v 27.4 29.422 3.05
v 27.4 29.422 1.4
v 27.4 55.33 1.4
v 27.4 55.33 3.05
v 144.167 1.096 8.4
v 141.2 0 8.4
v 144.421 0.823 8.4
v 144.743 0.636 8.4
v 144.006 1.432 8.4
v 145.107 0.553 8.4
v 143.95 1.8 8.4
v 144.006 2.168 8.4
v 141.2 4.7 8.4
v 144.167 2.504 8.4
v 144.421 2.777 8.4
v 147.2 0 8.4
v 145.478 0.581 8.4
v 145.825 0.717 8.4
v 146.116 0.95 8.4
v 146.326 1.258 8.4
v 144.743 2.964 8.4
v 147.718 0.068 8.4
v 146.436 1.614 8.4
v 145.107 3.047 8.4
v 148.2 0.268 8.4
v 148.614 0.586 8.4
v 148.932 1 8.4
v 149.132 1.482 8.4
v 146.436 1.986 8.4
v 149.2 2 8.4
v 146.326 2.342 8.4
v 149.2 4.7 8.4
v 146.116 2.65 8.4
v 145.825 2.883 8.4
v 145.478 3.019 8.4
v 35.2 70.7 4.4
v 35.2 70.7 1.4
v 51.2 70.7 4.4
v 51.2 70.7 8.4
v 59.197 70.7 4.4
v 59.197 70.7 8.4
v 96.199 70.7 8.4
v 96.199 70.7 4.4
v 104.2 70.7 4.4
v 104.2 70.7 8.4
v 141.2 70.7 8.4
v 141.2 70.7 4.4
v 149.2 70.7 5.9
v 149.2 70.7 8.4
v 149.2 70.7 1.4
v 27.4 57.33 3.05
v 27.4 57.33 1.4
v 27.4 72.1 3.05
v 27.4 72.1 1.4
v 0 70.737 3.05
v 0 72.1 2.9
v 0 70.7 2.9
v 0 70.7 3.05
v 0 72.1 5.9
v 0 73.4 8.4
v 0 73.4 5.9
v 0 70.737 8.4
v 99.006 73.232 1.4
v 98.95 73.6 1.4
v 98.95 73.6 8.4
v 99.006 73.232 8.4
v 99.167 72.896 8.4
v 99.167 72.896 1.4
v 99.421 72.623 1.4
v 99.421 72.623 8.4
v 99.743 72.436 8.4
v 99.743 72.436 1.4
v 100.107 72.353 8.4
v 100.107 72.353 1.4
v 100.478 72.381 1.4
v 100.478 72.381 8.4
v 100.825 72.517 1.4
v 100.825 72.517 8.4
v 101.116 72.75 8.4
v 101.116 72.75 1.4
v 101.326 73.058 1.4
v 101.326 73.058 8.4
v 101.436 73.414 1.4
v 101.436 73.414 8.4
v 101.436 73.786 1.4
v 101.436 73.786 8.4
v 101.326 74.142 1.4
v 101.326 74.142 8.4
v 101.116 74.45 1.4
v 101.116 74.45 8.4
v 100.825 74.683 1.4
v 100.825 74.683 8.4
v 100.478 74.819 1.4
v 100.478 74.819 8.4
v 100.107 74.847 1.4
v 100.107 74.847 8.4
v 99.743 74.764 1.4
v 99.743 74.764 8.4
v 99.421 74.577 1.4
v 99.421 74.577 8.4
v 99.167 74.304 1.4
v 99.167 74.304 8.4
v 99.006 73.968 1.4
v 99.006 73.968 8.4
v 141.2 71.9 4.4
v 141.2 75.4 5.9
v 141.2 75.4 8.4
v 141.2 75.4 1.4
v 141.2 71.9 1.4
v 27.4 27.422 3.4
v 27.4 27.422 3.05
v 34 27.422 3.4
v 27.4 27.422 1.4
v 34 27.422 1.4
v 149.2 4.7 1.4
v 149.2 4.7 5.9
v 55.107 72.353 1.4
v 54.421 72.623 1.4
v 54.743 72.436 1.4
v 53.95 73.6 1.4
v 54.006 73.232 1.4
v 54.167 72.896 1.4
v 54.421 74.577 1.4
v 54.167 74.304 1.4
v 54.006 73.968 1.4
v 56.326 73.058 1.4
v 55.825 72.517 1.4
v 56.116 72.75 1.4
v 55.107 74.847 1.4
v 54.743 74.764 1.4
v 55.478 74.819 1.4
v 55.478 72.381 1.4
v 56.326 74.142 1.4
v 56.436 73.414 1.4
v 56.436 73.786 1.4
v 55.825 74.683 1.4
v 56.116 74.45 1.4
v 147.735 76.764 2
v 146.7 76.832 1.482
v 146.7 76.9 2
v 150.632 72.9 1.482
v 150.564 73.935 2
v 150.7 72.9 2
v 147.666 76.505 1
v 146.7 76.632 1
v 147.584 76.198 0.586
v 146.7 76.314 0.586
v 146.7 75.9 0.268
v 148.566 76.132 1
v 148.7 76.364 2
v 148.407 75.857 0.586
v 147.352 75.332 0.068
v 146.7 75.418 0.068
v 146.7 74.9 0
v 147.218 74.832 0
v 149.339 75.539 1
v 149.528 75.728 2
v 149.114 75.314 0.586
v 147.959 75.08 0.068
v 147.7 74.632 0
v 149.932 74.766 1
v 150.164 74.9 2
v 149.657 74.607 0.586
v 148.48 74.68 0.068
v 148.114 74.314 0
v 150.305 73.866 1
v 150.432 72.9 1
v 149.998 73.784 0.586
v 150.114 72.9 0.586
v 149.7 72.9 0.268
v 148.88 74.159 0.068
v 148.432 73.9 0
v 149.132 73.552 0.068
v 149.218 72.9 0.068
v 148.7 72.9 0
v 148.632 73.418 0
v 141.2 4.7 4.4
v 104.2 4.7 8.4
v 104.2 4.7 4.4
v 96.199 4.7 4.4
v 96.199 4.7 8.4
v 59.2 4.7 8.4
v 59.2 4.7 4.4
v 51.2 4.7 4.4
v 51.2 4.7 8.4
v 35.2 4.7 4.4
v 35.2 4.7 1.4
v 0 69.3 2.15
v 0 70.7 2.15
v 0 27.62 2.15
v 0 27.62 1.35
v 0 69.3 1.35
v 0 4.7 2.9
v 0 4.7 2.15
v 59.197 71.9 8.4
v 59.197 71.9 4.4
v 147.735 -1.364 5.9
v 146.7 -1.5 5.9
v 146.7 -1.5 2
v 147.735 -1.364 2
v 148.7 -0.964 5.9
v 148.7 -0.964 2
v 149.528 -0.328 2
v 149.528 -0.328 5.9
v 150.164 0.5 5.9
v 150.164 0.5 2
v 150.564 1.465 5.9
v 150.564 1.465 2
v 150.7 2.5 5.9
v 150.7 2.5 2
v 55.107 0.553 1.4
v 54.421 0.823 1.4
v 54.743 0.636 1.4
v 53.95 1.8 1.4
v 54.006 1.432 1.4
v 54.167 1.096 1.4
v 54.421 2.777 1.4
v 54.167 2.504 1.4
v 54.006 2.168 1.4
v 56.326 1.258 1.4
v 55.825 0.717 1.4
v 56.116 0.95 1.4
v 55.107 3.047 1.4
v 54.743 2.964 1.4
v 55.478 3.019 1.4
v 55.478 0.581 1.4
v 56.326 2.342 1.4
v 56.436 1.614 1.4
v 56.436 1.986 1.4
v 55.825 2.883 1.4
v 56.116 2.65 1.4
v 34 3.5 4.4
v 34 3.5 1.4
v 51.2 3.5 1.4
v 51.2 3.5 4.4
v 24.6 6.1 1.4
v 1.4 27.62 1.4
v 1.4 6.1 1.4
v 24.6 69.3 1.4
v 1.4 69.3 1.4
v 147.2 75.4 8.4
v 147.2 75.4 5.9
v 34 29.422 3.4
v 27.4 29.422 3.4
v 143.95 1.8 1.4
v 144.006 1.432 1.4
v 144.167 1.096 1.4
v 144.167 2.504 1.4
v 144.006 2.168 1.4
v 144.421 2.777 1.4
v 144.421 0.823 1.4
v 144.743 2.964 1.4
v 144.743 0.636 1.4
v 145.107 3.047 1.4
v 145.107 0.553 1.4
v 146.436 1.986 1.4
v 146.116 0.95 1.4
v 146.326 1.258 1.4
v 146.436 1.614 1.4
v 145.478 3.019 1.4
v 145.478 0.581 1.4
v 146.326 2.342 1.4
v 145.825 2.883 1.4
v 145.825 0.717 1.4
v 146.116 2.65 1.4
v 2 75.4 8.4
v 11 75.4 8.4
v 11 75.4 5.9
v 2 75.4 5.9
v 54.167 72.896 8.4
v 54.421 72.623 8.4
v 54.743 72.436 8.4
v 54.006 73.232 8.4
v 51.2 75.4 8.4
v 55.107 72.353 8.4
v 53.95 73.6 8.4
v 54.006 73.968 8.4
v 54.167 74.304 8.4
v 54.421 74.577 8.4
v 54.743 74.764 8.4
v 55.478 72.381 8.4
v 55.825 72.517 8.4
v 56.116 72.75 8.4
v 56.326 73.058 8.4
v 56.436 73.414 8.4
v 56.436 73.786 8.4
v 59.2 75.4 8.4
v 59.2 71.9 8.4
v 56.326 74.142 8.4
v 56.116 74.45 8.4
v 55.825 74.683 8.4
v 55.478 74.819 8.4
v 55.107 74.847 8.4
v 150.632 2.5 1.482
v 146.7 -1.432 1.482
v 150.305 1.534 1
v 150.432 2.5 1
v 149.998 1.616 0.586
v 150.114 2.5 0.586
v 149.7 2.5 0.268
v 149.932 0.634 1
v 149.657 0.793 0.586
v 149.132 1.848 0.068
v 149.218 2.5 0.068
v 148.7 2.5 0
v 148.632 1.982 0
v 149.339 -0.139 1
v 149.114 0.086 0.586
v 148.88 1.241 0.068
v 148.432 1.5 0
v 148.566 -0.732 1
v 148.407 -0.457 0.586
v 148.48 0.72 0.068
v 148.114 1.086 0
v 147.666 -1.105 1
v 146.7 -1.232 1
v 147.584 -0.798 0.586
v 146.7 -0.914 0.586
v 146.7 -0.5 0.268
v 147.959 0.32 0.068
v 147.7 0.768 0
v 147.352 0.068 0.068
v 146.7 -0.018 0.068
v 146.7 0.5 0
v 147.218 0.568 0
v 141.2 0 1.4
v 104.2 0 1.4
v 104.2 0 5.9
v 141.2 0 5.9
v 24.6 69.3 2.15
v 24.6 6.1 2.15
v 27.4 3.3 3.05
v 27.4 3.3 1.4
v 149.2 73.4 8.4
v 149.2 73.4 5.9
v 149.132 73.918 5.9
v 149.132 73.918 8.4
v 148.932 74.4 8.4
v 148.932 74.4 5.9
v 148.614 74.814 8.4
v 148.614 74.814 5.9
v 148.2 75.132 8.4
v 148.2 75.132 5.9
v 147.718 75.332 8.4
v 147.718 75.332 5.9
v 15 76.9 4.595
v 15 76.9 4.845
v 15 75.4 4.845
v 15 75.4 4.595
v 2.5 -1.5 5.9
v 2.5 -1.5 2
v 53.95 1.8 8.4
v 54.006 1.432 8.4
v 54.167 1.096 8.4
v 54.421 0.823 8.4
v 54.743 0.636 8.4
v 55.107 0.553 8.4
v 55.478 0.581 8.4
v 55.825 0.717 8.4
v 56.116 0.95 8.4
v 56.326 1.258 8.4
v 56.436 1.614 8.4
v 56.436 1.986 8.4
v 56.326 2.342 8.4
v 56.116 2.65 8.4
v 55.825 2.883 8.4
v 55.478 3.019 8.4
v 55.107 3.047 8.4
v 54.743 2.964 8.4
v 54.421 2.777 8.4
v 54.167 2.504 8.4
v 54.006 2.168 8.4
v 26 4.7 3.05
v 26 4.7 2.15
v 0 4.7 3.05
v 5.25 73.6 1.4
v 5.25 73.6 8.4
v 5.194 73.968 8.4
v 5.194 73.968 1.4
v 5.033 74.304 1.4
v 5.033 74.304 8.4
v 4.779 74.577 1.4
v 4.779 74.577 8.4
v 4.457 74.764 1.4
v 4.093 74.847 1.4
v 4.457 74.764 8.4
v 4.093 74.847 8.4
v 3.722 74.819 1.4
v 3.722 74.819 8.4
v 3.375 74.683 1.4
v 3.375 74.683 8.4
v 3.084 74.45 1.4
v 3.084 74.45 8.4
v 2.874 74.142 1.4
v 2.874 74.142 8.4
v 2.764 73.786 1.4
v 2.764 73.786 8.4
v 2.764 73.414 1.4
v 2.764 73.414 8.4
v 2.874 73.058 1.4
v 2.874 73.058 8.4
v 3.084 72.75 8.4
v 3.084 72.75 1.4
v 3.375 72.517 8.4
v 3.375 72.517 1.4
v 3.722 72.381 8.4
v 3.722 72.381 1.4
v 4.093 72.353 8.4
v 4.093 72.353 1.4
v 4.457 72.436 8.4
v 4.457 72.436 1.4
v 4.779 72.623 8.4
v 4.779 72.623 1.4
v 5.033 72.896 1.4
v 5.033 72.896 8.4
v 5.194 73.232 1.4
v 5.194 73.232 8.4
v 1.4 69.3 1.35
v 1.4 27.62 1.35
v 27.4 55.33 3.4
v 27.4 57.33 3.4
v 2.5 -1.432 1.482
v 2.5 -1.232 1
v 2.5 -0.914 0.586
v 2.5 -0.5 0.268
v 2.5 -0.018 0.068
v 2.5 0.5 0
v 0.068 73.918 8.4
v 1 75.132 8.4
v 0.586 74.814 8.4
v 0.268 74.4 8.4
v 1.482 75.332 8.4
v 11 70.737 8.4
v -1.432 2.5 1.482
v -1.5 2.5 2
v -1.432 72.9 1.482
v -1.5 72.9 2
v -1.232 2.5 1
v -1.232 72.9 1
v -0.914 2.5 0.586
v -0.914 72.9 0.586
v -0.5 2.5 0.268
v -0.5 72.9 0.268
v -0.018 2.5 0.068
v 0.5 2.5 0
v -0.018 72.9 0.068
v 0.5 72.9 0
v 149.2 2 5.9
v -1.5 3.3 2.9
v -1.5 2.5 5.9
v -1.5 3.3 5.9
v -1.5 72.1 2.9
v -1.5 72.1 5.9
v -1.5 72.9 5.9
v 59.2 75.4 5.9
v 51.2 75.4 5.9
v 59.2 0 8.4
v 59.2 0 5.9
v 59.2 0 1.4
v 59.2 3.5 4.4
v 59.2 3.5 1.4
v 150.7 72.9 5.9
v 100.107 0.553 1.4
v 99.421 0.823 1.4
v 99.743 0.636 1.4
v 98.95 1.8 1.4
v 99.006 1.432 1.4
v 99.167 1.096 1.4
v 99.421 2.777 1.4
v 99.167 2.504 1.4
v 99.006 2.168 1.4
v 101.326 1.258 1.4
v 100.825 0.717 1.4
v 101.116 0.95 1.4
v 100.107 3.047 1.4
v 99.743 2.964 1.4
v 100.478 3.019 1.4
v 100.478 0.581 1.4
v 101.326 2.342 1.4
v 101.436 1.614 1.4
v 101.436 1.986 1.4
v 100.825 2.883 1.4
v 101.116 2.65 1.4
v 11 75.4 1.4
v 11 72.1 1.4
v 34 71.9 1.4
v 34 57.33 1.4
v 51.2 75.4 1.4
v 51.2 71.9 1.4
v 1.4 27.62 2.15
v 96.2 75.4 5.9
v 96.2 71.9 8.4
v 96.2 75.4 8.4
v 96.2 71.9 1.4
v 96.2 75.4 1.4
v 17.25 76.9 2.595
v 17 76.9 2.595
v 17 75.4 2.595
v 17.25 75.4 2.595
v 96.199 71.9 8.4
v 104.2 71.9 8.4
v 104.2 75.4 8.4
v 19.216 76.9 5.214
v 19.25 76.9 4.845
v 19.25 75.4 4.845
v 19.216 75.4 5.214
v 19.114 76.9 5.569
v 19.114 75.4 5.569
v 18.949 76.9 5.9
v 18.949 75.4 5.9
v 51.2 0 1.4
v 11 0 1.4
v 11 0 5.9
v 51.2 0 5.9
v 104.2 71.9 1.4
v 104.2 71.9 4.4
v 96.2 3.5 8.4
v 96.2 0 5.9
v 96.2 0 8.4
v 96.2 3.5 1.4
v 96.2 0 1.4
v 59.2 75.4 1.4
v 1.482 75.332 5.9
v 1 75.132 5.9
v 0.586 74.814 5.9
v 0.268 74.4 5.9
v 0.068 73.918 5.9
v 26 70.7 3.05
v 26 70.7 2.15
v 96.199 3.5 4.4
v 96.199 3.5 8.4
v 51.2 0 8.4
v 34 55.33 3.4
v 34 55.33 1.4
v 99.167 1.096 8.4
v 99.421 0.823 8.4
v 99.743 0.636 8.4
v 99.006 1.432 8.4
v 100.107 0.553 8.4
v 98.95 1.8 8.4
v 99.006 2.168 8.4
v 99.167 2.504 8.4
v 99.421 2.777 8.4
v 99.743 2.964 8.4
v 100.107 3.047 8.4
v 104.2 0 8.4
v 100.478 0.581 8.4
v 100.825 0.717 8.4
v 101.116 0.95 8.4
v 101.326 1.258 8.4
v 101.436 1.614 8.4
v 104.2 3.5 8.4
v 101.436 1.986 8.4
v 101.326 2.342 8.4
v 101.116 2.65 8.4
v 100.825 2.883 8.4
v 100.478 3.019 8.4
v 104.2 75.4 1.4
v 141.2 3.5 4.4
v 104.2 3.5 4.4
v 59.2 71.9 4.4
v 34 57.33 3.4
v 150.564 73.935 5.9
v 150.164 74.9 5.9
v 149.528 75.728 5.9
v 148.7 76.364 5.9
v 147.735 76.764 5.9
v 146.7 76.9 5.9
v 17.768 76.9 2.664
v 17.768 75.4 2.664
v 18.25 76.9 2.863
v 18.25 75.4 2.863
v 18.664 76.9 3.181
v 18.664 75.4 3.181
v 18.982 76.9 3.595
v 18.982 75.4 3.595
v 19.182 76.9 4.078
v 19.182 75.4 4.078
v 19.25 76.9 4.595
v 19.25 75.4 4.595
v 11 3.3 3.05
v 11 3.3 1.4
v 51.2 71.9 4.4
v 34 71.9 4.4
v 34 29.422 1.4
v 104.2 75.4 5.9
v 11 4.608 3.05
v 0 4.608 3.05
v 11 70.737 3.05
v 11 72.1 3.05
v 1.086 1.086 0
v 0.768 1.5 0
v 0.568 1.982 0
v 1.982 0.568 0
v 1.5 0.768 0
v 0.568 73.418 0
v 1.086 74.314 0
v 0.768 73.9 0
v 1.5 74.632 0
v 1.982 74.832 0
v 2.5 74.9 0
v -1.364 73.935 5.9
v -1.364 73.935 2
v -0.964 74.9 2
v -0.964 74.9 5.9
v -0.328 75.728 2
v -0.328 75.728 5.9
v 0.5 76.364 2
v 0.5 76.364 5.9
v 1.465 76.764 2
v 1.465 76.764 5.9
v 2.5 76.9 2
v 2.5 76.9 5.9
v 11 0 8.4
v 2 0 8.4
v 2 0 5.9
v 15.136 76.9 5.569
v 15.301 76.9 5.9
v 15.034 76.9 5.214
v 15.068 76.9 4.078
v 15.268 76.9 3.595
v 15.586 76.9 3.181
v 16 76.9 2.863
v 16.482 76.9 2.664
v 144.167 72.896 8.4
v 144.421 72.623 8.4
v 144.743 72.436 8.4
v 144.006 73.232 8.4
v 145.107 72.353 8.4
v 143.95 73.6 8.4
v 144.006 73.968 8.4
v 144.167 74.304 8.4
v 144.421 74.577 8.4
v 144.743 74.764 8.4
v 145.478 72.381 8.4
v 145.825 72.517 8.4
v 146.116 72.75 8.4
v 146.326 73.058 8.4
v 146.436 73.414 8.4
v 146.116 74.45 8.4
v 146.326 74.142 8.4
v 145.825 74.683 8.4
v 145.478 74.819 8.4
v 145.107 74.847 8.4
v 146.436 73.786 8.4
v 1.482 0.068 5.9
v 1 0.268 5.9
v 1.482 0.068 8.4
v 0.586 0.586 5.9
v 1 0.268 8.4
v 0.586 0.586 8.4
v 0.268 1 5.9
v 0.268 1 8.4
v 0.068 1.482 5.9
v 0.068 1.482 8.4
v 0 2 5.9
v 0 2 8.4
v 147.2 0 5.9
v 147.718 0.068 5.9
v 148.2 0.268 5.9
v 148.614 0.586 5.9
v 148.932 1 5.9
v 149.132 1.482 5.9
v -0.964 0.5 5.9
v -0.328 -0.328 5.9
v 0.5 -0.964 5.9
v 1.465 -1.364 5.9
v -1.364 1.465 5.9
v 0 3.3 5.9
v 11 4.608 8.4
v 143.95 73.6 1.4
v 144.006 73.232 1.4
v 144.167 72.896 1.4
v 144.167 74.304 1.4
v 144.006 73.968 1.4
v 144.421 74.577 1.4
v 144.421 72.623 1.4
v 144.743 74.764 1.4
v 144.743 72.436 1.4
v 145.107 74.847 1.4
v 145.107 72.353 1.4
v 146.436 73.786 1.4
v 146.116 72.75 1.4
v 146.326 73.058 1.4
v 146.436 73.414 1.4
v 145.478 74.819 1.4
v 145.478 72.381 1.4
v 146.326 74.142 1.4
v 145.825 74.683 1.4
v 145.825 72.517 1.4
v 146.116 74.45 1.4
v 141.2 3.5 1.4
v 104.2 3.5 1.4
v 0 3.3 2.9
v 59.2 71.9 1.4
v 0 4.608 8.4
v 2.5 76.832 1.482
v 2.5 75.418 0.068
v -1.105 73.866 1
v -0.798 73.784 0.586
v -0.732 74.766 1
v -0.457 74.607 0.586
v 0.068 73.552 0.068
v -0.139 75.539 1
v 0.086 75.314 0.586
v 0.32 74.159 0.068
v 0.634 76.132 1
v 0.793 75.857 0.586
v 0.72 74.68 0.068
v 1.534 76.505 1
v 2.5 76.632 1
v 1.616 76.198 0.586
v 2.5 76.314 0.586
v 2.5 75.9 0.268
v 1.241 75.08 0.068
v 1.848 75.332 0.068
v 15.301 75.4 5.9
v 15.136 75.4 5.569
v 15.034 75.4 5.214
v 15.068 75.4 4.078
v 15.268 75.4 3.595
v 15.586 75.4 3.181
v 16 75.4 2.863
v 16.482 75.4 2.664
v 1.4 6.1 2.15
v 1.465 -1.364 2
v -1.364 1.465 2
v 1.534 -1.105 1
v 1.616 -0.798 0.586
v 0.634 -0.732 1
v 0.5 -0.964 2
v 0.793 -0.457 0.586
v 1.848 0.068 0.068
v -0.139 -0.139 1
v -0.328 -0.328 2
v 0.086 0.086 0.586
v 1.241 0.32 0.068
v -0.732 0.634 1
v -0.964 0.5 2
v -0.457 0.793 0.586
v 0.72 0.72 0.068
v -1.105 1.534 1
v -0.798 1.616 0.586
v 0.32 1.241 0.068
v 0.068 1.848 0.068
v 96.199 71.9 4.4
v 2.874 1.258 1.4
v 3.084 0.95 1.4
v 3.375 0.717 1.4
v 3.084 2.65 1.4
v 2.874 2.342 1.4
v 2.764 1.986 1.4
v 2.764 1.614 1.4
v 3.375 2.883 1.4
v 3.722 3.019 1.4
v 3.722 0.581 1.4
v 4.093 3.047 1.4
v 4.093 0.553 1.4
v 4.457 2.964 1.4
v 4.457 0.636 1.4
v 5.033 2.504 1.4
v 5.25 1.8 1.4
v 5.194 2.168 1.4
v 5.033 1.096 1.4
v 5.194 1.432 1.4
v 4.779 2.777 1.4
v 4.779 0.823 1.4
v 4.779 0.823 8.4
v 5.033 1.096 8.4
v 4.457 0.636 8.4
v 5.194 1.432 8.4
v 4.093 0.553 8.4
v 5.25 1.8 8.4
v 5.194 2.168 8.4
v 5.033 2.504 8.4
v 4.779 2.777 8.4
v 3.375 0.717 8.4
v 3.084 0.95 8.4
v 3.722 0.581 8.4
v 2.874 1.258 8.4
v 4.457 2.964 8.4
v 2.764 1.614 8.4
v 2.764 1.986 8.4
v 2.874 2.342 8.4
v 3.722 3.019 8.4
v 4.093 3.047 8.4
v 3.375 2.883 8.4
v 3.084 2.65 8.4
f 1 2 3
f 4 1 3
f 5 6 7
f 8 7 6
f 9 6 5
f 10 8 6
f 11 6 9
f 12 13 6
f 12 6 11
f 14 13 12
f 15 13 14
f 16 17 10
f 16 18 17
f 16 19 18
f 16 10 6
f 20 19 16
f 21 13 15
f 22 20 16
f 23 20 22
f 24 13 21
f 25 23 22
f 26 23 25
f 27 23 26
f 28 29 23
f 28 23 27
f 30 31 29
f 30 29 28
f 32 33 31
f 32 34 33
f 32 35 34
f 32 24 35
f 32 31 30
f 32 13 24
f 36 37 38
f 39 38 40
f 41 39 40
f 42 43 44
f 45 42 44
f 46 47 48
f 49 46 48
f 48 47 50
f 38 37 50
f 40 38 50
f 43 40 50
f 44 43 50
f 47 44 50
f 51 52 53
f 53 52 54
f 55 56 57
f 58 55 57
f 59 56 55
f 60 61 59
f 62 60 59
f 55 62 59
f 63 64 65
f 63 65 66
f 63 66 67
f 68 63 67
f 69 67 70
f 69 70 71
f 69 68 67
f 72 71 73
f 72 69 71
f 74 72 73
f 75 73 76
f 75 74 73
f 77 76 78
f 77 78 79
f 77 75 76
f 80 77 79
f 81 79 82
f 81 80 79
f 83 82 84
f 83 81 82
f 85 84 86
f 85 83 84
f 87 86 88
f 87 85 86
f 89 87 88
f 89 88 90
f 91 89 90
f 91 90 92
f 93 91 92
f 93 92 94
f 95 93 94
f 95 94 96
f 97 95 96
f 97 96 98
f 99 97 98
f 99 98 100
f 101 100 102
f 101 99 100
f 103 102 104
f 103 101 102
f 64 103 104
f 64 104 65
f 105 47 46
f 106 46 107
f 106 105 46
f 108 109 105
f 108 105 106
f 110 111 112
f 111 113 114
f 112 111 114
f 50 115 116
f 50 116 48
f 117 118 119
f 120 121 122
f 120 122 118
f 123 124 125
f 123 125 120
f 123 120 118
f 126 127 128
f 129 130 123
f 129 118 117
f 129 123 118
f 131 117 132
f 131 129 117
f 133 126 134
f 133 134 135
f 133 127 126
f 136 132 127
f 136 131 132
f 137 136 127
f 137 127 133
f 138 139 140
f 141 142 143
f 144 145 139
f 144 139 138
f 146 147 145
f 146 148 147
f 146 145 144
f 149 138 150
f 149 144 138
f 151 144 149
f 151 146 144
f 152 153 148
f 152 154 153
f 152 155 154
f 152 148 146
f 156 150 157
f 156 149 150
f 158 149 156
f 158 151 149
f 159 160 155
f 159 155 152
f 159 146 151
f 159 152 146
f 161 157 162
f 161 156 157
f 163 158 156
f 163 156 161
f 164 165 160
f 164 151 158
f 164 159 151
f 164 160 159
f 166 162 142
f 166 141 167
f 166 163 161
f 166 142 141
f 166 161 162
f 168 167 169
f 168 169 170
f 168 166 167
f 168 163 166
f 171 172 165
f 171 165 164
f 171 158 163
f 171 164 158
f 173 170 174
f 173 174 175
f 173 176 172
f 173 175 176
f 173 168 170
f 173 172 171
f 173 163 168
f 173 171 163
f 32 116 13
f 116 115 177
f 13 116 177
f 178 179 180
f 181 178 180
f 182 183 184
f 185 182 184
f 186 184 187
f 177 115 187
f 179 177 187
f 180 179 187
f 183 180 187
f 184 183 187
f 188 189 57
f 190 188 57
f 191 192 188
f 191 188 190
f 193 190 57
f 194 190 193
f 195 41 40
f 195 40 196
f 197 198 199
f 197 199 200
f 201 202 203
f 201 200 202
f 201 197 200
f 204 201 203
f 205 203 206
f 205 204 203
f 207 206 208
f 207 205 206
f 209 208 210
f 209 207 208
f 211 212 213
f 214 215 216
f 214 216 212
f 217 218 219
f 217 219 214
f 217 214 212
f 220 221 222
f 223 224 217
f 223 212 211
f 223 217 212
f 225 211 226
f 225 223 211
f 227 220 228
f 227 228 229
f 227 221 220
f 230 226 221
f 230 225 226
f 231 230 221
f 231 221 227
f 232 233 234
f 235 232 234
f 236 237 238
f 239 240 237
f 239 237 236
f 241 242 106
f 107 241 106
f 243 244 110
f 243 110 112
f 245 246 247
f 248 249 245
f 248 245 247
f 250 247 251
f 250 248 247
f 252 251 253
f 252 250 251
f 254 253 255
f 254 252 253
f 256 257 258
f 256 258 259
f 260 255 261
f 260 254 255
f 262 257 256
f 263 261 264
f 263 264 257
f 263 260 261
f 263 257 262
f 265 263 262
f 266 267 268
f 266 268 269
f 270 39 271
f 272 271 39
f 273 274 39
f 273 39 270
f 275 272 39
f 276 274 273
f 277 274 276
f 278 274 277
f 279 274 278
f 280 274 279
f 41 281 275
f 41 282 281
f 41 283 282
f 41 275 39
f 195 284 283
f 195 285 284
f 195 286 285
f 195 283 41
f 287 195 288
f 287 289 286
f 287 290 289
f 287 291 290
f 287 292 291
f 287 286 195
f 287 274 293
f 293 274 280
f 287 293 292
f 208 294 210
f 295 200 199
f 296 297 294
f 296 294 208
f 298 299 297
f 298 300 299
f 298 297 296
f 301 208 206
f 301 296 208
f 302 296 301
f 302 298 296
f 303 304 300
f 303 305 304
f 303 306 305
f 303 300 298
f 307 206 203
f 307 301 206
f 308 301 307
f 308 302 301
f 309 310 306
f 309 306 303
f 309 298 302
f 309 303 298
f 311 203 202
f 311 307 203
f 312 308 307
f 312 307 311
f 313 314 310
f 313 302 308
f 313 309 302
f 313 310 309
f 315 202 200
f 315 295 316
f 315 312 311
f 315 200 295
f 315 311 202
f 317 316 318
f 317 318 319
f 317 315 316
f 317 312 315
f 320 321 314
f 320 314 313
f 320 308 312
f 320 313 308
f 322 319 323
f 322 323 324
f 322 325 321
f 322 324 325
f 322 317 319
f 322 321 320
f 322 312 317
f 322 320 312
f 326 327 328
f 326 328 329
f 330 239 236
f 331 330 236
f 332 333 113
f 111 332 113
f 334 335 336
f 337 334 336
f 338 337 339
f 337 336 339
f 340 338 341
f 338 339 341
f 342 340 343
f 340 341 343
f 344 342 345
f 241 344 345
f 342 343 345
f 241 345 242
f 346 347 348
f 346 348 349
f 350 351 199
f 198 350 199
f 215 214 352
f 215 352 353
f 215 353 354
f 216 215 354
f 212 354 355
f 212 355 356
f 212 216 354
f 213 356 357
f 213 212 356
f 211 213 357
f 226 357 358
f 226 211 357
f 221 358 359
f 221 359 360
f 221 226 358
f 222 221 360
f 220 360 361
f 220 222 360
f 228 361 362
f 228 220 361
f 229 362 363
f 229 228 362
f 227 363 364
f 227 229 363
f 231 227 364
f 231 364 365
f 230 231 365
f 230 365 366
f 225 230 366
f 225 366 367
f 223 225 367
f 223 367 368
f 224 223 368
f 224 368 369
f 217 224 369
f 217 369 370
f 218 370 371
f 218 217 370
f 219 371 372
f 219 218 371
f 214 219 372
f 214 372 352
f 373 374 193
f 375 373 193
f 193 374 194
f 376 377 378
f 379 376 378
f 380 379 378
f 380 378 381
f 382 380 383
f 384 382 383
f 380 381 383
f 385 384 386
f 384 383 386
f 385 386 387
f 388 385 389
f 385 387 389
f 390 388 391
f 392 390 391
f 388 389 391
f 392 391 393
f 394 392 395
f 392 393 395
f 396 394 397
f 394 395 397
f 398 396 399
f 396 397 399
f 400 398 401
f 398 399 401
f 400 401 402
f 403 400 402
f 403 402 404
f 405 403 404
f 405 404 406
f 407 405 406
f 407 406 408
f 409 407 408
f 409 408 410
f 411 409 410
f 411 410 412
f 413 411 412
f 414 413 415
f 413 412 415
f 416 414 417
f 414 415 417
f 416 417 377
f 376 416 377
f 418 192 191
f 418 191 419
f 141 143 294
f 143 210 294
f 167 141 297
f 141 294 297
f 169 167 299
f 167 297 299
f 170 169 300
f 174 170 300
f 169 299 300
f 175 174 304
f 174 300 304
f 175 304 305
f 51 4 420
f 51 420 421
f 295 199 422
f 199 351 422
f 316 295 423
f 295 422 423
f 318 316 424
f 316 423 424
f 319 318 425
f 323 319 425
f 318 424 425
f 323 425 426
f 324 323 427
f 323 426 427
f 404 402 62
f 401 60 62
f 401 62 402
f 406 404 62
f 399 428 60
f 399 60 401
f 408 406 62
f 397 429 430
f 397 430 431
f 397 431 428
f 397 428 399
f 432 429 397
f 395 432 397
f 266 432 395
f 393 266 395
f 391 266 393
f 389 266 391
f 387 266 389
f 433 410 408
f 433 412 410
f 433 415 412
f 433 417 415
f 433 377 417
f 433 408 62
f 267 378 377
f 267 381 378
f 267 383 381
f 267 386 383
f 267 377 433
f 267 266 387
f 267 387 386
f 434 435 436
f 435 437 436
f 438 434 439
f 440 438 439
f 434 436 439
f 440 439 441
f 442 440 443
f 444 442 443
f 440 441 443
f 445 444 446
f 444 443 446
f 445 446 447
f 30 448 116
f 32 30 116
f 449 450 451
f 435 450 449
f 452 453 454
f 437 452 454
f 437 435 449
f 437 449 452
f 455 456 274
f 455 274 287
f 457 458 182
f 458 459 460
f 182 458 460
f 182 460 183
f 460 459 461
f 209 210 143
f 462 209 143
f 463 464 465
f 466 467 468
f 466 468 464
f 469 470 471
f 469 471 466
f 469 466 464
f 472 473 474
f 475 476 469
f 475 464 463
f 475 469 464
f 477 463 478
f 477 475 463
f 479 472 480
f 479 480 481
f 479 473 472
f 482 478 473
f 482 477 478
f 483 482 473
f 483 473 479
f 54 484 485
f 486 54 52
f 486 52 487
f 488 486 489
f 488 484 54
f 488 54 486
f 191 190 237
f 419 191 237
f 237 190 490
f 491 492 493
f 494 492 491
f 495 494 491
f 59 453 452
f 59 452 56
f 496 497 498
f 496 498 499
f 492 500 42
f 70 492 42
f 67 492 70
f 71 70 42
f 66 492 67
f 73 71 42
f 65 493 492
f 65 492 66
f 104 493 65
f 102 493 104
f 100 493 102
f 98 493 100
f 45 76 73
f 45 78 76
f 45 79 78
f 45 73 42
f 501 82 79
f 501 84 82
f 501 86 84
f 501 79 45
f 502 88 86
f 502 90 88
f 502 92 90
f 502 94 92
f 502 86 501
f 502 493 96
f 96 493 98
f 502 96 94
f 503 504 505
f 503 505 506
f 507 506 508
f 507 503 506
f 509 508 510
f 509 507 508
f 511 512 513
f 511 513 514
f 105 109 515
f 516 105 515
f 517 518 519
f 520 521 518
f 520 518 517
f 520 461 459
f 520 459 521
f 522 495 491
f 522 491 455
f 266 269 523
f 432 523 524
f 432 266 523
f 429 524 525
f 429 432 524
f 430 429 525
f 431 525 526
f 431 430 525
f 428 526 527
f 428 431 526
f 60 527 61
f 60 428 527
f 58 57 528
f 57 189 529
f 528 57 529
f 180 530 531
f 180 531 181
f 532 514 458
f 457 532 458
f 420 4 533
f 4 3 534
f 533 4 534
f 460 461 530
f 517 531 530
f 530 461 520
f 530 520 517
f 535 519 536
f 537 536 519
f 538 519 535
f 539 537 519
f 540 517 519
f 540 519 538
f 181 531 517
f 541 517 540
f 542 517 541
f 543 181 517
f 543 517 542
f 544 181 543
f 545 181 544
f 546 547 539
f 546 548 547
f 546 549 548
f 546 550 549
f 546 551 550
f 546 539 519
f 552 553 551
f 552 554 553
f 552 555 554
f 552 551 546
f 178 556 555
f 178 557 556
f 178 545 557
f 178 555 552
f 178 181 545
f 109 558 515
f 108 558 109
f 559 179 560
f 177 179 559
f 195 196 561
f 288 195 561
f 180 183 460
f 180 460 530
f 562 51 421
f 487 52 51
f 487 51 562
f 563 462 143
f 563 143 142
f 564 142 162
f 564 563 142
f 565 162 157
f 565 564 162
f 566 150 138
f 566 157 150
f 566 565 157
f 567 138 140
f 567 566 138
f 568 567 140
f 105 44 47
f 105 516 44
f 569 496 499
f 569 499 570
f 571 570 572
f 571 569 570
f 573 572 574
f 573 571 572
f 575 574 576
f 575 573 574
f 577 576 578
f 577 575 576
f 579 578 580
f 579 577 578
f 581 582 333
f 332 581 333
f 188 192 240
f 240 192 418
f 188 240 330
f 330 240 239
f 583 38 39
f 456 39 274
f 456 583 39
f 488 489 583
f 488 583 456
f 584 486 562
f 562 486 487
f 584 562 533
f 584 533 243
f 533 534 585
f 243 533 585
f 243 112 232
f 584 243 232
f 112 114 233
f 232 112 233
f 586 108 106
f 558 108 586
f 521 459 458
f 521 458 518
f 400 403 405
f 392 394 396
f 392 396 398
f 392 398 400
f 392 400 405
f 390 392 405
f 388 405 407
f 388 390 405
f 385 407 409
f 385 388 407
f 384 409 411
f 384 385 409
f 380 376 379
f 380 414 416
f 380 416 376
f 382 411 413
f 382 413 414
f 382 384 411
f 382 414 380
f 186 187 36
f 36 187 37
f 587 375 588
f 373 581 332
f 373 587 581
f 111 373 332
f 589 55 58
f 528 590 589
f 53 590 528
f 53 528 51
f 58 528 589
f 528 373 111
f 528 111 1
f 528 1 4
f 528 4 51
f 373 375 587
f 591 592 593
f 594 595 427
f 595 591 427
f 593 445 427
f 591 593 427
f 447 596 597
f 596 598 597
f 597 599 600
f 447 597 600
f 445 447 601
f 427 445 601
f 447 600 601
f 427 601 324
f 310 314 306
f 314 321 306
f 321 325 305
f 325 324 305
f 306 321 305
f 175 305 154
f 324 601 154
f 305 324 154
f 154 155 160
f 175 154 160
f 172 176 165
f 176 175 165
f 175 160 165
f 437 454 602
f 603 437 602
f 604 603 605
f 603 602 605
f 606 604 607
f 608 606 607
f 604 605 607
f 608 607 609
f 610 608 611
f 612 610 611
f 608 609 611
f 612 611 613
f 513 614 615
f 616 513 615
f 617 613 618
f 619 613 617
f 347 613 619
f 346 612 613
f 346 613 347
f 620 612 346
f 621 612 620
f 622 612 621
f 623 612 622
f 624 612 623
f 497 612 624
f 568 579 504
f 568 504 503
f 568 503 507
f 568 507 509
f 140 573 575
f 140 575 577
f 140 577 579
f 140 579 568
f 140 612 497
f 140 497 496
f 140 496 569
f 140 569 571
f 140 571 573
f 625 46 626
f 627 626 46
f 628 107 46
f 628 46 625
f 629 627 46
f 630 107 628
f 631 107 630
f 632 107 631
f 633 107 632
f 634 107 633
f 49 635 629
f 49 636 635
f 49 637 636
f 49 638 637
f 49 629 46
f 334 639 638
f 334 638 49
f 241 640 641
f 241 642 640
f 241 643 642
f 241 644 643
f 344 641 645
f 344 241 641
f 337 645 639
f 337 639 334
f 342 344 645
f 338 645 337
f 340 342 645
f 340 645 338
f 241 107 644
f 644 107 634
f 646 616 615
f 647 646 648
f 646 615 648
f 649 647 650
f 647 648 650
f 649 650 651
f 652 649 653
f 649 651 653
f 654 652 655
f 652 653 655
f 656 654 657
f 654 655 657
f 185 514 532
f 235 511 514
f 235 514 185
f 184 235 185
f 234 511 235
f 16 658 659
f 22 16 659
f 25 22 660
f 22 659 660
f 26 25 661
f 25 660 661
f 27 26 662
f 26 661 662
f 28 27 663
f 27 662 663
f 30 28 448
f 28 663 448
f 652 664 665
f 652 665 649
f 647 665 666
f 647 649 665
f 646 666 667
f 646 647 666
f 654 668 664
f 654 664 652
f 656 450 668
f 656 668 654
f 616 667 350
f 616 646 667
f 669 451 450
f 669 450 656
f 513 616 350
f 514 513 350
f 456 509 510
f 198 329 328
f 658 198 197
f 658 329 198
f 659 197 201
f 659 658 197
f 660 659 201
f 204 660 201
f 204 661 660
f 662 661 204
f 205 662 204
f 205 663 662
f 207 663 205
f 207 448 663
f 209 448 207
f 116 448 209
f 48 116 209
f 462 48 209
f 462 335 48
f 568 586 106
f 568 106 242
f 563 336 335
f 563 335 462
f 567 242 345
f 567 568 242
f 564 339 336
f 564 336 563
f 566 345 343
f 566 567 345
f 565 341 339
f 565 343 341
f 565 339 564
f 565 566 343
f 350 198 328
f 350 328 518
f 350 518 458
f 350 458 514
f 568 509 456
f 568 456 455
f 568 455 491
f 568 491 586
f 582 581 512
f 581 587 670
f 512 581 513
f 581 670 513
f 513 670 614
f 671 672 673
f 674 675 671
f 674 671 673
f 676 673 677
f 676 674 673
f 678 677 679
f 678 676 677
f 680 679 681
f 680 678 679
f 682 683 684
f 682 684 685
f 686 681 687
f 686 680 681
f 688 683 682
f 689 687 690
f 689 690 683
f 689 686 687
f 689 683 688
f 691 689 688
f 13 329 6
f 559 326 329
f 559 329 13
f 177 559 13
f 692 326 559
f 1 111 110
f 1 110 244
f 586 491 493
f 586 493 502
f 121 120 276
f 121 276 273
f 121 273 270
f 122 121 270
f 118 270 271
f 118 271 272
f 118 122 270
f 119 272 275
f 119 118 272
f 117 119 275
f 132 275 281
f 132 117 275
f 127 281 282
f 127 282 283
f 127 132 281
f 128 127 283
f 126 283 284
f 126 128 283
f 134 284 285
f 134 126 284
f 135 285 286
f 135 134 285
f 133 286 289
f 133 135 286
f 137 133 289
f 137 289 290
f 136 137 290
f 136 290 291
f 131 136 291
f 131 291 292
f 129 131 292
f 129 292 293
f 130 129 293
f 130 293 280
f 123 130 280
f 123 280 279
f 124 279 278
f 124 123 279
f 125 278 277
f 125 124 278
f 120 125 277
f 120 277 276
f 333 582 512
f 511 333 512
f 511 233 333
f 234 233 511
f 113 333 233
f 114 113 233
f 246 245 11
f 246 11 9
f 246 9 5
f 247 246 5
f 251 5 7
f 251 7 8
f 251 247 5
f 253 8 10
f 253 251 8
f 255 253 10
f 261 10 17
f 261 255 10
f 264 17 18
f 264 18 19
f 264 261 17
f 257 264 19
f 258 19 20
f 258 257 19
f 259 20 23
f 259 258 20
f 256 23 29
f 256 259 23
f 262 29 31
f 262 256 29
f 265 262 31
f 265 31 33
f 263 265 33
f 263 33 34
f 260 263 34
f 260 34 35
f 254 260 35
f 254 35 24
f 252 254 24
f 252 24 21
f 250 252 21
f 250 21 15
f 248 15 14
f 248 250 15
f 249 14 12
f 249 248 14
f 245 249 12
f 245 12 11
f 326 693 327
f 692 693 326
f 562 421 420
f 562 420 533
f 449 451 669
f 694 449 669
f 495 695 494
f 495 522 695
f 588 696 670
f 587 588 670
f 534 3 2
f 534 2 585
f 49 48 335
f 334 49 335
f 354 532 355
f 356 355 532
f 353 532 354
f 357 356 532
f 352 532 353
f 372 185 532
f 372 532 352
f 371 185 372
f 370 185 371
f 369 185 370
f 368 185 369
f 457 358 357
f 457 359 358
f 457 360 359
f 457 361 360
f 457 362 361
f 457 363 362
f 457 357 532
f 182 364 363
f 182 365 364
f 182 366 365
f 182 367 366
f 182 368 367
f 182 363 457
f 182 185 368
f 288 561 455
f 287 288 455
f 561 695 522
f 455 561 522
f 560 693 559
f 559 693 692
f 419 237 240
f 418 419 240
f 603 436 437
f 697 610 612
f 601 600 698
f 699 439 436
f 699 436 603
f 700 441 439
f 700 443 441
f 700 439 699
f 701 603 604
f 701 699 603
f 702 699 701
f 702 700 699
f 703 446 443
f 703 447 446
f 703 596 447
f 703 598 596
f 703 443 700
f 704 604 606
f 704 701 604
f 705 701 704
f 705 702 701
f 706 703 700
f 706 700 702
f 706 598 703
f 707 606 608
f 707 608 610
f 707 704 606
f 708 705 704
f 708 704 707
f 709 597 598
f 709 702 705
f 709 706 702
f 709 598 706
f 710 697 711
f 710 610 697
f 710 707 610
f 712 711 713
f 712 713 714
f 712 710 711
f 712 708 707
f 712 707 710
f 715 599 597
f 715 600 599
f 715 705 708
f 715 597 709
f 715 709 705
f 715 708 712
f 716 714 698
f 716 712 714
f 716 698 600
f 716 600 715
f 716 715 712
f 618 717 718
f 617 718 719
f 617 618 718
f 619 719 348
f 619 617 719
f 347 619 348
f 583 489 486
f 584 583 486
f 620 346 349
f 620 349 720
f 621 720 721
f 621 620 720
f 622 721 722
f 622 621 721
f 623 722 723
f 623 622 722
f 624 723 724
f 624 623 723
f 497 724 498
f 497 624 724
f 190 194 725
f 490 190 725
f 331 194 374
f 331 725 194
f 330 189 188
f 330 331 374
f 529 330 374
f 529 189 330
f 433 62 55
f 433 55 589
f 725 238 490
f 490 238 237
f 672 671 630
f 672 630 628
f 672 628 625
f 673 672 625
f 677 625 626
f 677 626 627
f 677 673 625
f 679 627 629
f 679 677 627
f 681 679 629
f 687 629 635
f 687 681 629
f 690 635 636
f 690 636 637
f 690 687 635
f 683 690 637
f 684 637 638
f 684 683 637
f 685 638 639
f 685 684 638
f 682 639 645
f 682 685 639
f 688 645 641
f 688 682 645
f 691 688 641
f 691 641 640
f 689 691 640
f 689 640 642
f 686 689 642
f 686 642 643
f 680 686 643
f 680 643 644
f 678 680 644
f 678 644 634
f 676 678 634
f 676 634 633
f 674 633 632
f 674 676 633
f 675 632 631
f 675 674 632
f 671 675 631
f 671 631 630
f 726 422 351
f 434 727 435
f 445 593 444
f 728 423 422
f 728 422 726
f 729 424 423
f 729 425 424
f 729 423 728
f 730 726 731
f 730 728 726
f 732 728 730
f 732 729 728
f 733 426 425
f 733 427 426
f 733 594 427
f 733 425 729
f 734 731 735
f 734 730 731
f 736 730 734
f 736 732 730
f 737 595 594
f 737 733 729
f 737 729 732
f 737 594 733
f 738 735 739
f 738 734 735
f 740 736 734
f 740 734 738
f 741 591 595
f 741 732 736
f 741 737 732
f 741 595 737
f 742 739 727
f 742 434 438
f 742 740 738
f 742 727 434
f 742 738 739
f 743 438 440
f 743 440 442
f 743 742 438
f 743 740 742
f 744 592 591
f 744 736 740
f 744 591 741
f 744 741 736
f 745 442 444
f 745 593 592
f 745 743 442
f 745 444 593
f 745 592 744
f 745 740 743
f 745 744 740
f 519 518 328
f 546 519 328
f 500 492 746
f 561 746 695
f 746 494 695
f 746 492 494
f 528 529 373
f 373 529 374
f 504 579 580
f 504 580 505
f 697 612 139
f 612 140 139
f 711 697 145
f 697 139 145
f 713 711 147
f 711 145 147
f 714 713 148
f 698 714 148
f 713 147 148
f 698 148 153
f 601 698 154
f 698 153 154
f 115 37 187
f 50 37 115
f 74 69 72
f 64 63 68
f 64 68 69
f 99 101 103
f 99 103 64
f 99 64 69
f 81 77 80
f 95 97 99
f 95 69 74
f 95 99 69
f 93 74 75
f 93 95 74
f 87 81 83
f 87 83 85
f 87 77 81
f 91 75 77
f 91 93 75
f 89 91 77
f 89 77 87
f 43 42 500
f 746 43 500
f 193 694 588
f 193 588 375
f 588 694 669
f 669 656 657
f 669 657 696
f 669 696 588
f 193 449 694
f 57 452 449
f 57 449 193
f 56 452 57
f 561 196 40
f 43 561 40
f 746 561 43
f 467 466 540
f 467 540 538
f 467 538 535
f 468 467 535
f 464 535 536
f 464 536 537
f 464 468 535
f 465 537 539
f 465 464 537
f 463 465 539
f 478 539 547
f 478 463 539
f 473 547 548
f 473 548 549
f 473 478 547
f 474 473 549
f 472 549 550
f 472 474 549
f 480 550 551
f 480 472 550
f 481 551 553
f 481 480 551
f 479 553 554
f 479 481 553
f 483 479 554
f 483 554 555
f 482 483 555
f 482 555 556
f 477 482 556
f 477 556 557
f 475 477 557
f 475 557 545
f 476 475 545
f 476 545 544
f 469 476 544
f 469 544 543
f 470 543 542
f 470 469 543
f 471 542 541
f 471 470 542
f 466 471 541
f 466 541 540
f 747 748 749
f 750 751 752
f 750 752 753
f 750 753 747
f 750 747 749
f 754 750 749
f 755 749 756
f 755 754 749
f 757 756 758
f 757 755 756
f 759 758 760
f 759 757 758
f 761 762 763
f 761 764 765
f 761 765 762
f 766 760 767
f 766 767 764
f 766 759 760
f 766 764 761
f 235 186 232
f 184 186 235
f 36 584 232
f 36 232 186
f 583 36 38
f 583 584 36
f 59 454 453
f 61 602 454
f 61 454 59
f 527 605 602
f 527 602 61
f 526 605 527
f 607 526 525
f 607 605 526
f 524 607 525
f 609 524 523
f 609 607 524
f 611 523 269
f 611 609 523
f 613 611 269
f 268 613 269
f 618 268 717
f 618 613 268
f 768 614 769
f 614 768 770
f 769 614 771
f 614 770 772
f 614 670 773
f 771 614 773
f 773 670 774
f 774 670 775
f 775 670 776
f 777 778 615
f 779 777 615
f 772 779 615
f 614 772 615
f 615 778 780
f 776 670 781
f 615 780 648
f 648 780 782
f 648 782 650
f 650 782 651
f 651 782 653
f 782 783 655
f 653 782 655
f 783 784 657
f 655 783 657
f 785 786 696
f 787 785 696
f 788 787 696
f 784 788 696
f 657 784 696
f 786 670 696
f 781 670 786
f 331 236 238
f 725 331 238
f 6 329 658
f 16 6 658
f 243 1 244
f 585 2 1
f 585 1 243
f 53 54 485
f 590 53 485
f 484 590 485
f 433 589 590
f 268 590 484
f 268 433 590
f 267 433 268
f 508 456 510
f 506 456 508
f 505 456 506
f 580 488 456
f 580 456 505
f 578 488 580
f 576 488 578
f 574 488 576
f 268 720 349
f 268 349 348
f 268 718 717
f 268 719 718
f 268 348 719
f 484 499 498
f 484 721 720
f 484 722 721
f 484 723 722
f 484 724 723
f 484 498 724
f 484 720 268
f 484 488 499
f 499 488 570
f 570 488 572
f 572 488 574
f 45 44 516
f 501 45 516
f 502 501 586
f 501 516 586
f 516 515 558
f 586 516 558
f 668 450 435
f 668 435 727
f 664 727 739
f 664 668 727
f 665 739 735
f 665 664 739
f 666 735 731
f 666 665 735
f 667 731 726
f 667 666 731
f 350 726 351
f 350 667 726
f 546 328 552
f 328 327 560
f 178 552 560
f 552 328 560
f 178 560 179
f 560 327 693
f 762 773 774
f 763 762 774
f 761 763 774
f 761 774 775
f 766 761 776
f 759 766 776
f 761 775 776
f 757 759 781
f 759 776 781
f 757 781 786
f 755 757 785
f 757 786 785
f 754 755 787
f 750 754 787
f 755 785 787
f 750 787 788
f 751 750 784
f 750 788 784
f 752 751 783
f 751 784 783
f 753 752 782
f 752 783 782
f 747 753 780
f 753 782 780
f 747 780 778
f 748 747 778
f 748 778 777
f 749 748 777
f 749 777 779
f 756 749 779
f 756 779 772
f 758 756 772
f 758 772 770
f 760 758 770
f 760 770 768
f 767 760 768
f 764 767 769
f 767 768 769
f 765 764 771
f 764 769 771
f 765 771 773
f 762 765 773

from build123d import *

# Parameters (mm, degrees)
ESQUISSE1_W             = 152.2
ESQUISSE1_H             = 78.4
BOSS_EXTRU_1_DEPTH      = 5.9
BOSS_EXTRU_2_DEPTH      = 1.4
BOSS_EXTRU_5_START      = 1.4
ESQUISSE1_5_R           = 1.25
BOSS_EXTRU_5_DEPTH      = 7
ESQUISSE1_5_W           = 8
ESQUISSE1_5_H           = 3.5
BOSS_EXTRU_5_2_DEPTH    = 7
BOSS_EXTRU_5_3_DEPTH    = 7
BOSS_EXTRU_5_4_DEPTH    = 7
BOSS_EXTRU_5_5_DEPTH    = 7
BOSS_EXTRU_5_6_DEPTH    = 7
BOSS_EXTRU_7_START      = 1.4
BOSS_EXTRU_7_DEPTH      = 3
CONG_1_R                = 4
CONG_4_R                = 2
BOSS_EXTRU_8_START      = 1.4
BOSS_EXTRU_8_DEPTH      = 0.75
BOSS_EXTRU_9_START      = 1.4
BOSS_EXTRU_9_DEPTH      = 1.65
BOSS_EXTRU_11_START     = 7
ESQUISSE4_R             = 1.25
BOSS_EXTRU_11_DEPTH     = 7
ESQUISSE5_W             = 6.6
ESQUISSE5_H             = 2
BOSS_EXTRU_12_DEPTH     = 2
CONG_3_R                = 2
ESQUISSE2_W             = 1.5
ESQUISSE2_H             = 68.8
ENL_V_MAT_EXTRU_1_DEPTH = 3
ENL_V_MAT_EXTRU_2_DEPTH = 1.5
ESQUISSE7_W             = 1.4
ESQUISSE7_H             = 41.680372202
ENL_V_MAT_EXTRU_3_DEPTH = 0.8
ESQUISSE8_W             = 7.99674486
ESQUISSE8_H             = 1.2
ESQUISSE8_W_2           = 8.000773141
ESQUISSE8_W_3           = 8
BOSS_EXTRU_13_DEPTH     = 4


with BuildPart() as part:
    # Esquisse1 → Boss.-Extru.1 (new body)
    with BuildSketch(Plane.XY):
        with Locations((74.6, 37.7)):
            Rectangle(ESQUISSE1_W, ESQUISSE1_H)
        with BuildLine():
            Line((0, 0), (147.2, 0))
            ThreePointArc((147.2, 0), (148.614213562, 0.585786438), (149.2, 2))
            Line((149.2, 2), (149.2, 73.4))
            ThreePointArc((149.2, 73.4), (148.614213562, 74.814213562), (147.2, 75.4))
            Line((147.2, 75.4), (0, 75.4))
            Line((0, 75.4), (0, 0))
        make_face(mode=Mode.SUBTRACT)
    extrude(amount=BOSS_EXTRU_1_DEPTH)

    # Esquisse1<4> → Boss.-Extru.2 (add)
    with BuildSketch(Plane.XY):
        with BuildLine():
            Line((0, 0), (147.2, 0))
            ThreePointArc((147.2, 0), (148.614213562, 0.585786438), (149.2, 2))
            Line((149.2, 2), (149.2, 73.4))
            ThreePointArc((149.2, 73.4), (148.614213562, 74.814213562), (147.2, 75.4))
            Line((147.2, 75.4), (0, 75.4))
            Line((0, 75.4), (0, 0))
        make_face()
    extrude(amount=BOSS_EXTRU_2_DEPTH)

    # Esquisse1<6> → Boss.-Extru.7 (add)
    with BuildSketch(Plane.XY.offset(BOSS_EXTRU_7_START)):
        Polygon((149.2, 70.7), (149.2, 71.9), (141.2, 71.9), (104.2, 71.9), (96.2, 71.9), (59.2, 71.9), (51.2, 71.9), (34, 71.9), (34, 37.7), (35.2, 37.7), (35.2, 70.7), align=None)
        Polygon((149.2, 3.5), (149.2, 4.7), (35.2, 4.7), (35.2, 37.7), (34, 37.7), (34, 3.5), (51.2, 3.5), (59.2, 3.5), (96.2, 3.5), (104.2, 3.5), (141.2, 3.5), align=None)
    extrude(amount=BOSS_EXTRU_7_DEPTH)

    # Congé1
    cong_1_edges = [part.edges().sort_by_distance(p)[0] for p in [
        (-1.5, 76.9, 2.95),
        (150.7, 76.9, 2.95),
        (150.7, -1.5, 2.95),
        (-1.5, -1.5, 2.95),
    ]]
    fillet(cong_1_edges, radius=CONG_1_R)

    # Congé4
    cong_4_edges = [part.edges().sort_by_distance(p)[0] for p in [
        (0, 75.4, 3.65),
        (0, 0, 3.65),
    ]]
    fillet(cong_4_edges, radius=CONG_4_R)

    # Esquisse1<7> → Boss.-Extru.8 (add)
    with BuildSketch(Plane.XY.offset(BOSS_EXTRU_8_START)):
        Polygon((24.6, 37.7), (26, 37.7), (26, 70.7), (0, 70.7), (0, 37.7), (1.4, 37.7), (1.4, 69.3), (24.6, 69.3), align=None)
        Polygon((26, 4.7), (26, 37.7), (24.6, 37.7), (24.6, 6.1), (1.4, 6.1), (1.4, 37.7), (0, 37.7), (0, 4.7), align=None)
    extrude(amount=BOSS_EXTRU_8_DEPTH)

    # Esquisse1<8> → Boss.-Extru.9 (add)
    with BuildSketch(Plane.XY.offset(BOSS_EXTRU_9_START)):
        Polygon((27.4, 3.3), (27.4, 72.1), (0, 72.1), (0, 70.7), (26, 70.7), (26, 4.7), (0, 4.7), (0, 3.3), align=None)
    extrude(amount=BOSS_EXTRU_9_DEPTH)

    # Esquisse4 → Boss.-Extru.11 (add)
    # profile 1 of 2: a face of its own
    with BuildSketch(Plane.XY.offset(1.4).offset(BOSS_EXTRU_11_START)):
        with BuildLine():
            Line((11, 75.4), (2, 75.4))
            ThreePointArc((2, 75.4), (0.585786438, 74.814213562), (0, 73.4))
            Line((0, 73.4), (0, 70.737356087))
            Line((0, 70.737356087), (11, 70.737356087))
            Line((11, 70.737356087), (11, 75.4))
        make_face()
        with Locations((4, 73.6)):
            Circle(ESQUISSE4_R, mode=Mode.SUBTRACT)
    # profile 2 of 2: a face of its own
    with BuildSketch(Plane.XY.offset(1.4).offset(BOSS_EXTRU_11_START)):
        with BuildLine():
            Line((0, 4.608067271), (11, 4.608067271))
            Line((11, 4.608067271), (11, 0))
            Line((11, 0), (2, 0))
            ThreePointArc((2, 0), (0.585786438, 0.585786438), (0, 2))
            Line((0, 2), (0, 4.608067271))
        make_face()
        with Locations((4, 1.8)):
            Circle(ESQUISSE4_R, mode=Mode.SUBTRACT)
    extrude(amount=-BOSS_EXTRU_11_DEPTH)

    # Esquisse5 → Boss.-Extru.12 (add)
    with BuildSketch(Plane.XY.offset(1.4)):
        with Locations((30.7, 56.329620473)):
            Rectangle(ESQUISSE5_W, ESQUISSE5_H)
        with Locations((30.7, 28.421993419)):
            Rectangle(ESQUISSE5_W, ESQUISSE5_H)
    extrude(amount=BOSS_EXTRU_12_DEPTH)

    # Congé3
    cong_3_edges = [part.edges().sort_by_distance(p)[0] for p in [
        (-1.5, 37.7, 0),
        (74.6, 76.9, 0),
        (150.7, 37.7, 0),
        (74.6, -1.5, 0),
        (149.528427125, 75.728427125, 0),
        (149.528427125, -0.328427125, 0),
        (-0.328427125, -0.328427125, 0),
        (-0.328427125, 75.728427125, 0),
    ]]
    fillet(cong_3_edges, radius=CONG_3_R)

    # Esquisse2 → Enlèv. mat.-Extru.1 (cut)
    with BuildSketch(Plane.XY.offset(5.9)):
        with Locations((-0.75, 37.7)):
            Rectangle(ESQUISSE2_W, ESQUISSE2_H)
    extrude(amount=-ENL_V_MAT_EXTRU_1_DEPTH, mode=Mode.SUBTRACT)

    # Esquisse6 → Enlèv. mat.-Extru.2 (cut)
    with BuildSketch(Plane(origin=(0, 76.9, 0), x_dir=(1, 0, 0), z_dir=(0, 1, 0))):
        with BuildLine():
            Line((17, -2.595457244), (17.25, -2.595457244))
            ThreePointArc((17.25, -2.595457244), (18.664213562, -3.181243681), (19.25, -4.595457244))
            Line((19.25, -4.595457244), (19.25, -4.845457244))
            ThreePointArc((19.25, -4.845457244), (18.664213562, -6.259670806), (17.25, -6.845457244))
            Line((17.25, -6.845457244), (17, -6.845457244))
            ThreePointArc((17, -6.845457244), (15.585786438, -6.259670806), (15, -4.845457244))
            Line((15, -4.845457244), (15, -4.595457244))
            ThreePointArc((15, -4.595457244), (15.585786438, -3.181243681), (17, -2.595457244))
        make_face()
    extrude(amount=-ENL_V_MAT_EXTRU_2_DEPTH, mode=Mode.SUBTRACT)

    # Esquisse7 → Enlèv. mat.-Extru.3 (cut)
    with BuildSketch(Plane.XY.offset(2.15)):
        with Locations((0.7, 48.459813899)):
            Rectangle(ESQUISSE7_W, ESQUISSE7_H)
    extrude(amount=-ENL_V_MAT_EXTRU_3_DEPTH, mode=Mode.SUBTRACT)



with BuildPart() as body_2:
    # Esquisse1<5> → Boss.-Extru.5 (new body)
    with BuildSketch(Plane.XY.offset(BOSS_EXTRU_5_START)):
        with BuildLine():
            Line((141.2, 71.9), (149.2, 71.9))
            Line((149.2, 71.9), (149.2, 73.4))
            ThreePointArc((149.2, 73.4), (148.614213562, 74.814213562), (147.2, 75.4))
            Line((147.2, 75.4), (141.2, 75.4))
            Line((141.2, 75.4), (141.2, 71.9))
        make_face()
        with Locations(Location((145.2, 73.6, 0), (0, 0, 180))):
            Circle(ESQUISSE1_5_R, mode=Mode.SUBTRACT)
    extrude(amount=BOSS_EXTRU_5_DEPTH)


with BuildPart() as body_3:
    # Esquisse1<5> → Boss.-Extru.5 2 (new body)
    with BuildSketch(Plane.XY.offset(BOSS_EXTRU_5_START)):
        with Locations((100.2, 73.65)):
            Rectangle(ESQUISSE1_5_W, ESQUISSE1_5_H)
        with Locations(Location((100.2, 73.6, 0), (0, 0, 180))):
            Circle(ESQUISSE1_5_R, mode=Mode.SUBTRACT)
    extrude(amount=BOSS_EXTRU_5_2_DEPTH)


with BuildPart() as body_4:
    # Esquisse1<5> → Boss.-Extru.5 3 (new body)
    with BuildSketch(Plane.XY.offset(BOSS_EXTRU_5_START)):
        with BuildLine():
            Line((149.2, 2), (149.2, 3.5))
            Line((149.2, 3.5), (141.2, 3.5))
            Line((141.2, 3.5), (141.2, 0))
            Line((141.2, 0), (147.2, 0))
            ThreePointArc((147.2, 0), (148.614213562, 0.585786438), (149.2, 2))
        make_face()
        with Locations(Location((145.2, 1.8, 0), (0, 0, 180))):
            Circle(ESQUISSE1_5_R, mode=Mode.SUBTRACT)
    extrude(amount=BOSS_EXTRU_5_3_DEPTH)


with BuildPart() as body_5:
    # Esquisse1<5> → Boss.-Extru.5 4 (new body)
    with BuildSketch(Plane.XY.offset(BOSS_EXTRU_5_START)):
        with Locations((55.2, 73.65)):
            Rectangle(ESQUISSE1_5_W, ESQUISSE1_5_H)
        with Locations(Location((55.2, 73.6, 0), (0, 0, 180))):
            Circle(ESQUISSE1_5_R, mode=Mode.SUBTRACT)
    extrude(amount=BOSS_EXTRU_5_4_DEPTH)


with BuildPart() as body_6:
    # Esquisse1<5> → Boss.-Extru.5 5 (new body)
    with BuildSketch(Plane.XY.offset(BOSS_EXTRU_5_START)):
        with Locations((100.2, 1.75)):
            Rectangle(ESQUISSE1_5_W, ESQUISSE1_5_H)
        with Locations(Location((100.2, 1.8, 0), (0, 0, 180))):
            Circle(ESQUISSE1_5_R, mode=Mode.SUBTRACT)
    extrude(amount=BOSS_EXTRU_5_5_DEPTH)


with BuildPart() as body_7:
    # Esquisse1<5> → Boss.-Extru.5 6 (new body)
    with BuildSketch(Plane.XY.offset(BOSS_EXTRU_5_START)):
        with Locations((55.2, 1.75)):
            Rectangle(ESQUISSE1_5_W, ESQUISSE1_5_H)
        with Locations(Location((55.2, 1.8, 0), (0, 0, 180))):
            Circle(ESQUISSE1_5_R, mode=Mode.SUBTRACT)
    extrude(amount=BOSS_EXTRU_5_6_DEPTH)


with BuildPart() as part_1:
    add(part.part)

    add(body_2.part)  # Boss.-Extru.13 merges body 2

    add(body_3.part)  # Boss.-Extru.13 merges body 3

    add(body_4.part)  # Boss.-Extru.13 merges body 4

    add(body_5.part)  # Boss.-Extru.13 merges body 5

    add(body_6.part)  # Boss.-Extru.13 merges body 6

    add(body_7.part)  # Boss.-Extru.13 merges body 7
    # Esquisse8 → Boss.-Extru.13 (add)
    with BuildSketch(Plane.XY.offset(4.4)):
        with Locations((55.19837243, 71.3)):
            Rectangle(ESQUISSE8_W, ESQUISSE8_H)
        with Locations((100.19961343, 71.3)):
            Rectangle(ESQUISSE8_W_2, ESQUISSE8_H)
        with Locations((145.2, 71.3)):
            Rectangle(ESQUISSE8_W_3, ESQUISSE8_H)
        with Locations((145.2, 4.1)):
            Rectangle(ESQUISSE8_W_3, ESQUISSE8_H)
        with Locations((100.19961343, 4.1)):
            Rectangle(ESQUISSE8_W_2, ESQUISSE8_H)
        with Locations((55.2, 4.1)):
            Rectangle(ESQUISSE8_W_3, ESQUISSE8_H)
    extrude(amount=BOSS_EXTRU_13_DEPTH)


solid = part_1.part
